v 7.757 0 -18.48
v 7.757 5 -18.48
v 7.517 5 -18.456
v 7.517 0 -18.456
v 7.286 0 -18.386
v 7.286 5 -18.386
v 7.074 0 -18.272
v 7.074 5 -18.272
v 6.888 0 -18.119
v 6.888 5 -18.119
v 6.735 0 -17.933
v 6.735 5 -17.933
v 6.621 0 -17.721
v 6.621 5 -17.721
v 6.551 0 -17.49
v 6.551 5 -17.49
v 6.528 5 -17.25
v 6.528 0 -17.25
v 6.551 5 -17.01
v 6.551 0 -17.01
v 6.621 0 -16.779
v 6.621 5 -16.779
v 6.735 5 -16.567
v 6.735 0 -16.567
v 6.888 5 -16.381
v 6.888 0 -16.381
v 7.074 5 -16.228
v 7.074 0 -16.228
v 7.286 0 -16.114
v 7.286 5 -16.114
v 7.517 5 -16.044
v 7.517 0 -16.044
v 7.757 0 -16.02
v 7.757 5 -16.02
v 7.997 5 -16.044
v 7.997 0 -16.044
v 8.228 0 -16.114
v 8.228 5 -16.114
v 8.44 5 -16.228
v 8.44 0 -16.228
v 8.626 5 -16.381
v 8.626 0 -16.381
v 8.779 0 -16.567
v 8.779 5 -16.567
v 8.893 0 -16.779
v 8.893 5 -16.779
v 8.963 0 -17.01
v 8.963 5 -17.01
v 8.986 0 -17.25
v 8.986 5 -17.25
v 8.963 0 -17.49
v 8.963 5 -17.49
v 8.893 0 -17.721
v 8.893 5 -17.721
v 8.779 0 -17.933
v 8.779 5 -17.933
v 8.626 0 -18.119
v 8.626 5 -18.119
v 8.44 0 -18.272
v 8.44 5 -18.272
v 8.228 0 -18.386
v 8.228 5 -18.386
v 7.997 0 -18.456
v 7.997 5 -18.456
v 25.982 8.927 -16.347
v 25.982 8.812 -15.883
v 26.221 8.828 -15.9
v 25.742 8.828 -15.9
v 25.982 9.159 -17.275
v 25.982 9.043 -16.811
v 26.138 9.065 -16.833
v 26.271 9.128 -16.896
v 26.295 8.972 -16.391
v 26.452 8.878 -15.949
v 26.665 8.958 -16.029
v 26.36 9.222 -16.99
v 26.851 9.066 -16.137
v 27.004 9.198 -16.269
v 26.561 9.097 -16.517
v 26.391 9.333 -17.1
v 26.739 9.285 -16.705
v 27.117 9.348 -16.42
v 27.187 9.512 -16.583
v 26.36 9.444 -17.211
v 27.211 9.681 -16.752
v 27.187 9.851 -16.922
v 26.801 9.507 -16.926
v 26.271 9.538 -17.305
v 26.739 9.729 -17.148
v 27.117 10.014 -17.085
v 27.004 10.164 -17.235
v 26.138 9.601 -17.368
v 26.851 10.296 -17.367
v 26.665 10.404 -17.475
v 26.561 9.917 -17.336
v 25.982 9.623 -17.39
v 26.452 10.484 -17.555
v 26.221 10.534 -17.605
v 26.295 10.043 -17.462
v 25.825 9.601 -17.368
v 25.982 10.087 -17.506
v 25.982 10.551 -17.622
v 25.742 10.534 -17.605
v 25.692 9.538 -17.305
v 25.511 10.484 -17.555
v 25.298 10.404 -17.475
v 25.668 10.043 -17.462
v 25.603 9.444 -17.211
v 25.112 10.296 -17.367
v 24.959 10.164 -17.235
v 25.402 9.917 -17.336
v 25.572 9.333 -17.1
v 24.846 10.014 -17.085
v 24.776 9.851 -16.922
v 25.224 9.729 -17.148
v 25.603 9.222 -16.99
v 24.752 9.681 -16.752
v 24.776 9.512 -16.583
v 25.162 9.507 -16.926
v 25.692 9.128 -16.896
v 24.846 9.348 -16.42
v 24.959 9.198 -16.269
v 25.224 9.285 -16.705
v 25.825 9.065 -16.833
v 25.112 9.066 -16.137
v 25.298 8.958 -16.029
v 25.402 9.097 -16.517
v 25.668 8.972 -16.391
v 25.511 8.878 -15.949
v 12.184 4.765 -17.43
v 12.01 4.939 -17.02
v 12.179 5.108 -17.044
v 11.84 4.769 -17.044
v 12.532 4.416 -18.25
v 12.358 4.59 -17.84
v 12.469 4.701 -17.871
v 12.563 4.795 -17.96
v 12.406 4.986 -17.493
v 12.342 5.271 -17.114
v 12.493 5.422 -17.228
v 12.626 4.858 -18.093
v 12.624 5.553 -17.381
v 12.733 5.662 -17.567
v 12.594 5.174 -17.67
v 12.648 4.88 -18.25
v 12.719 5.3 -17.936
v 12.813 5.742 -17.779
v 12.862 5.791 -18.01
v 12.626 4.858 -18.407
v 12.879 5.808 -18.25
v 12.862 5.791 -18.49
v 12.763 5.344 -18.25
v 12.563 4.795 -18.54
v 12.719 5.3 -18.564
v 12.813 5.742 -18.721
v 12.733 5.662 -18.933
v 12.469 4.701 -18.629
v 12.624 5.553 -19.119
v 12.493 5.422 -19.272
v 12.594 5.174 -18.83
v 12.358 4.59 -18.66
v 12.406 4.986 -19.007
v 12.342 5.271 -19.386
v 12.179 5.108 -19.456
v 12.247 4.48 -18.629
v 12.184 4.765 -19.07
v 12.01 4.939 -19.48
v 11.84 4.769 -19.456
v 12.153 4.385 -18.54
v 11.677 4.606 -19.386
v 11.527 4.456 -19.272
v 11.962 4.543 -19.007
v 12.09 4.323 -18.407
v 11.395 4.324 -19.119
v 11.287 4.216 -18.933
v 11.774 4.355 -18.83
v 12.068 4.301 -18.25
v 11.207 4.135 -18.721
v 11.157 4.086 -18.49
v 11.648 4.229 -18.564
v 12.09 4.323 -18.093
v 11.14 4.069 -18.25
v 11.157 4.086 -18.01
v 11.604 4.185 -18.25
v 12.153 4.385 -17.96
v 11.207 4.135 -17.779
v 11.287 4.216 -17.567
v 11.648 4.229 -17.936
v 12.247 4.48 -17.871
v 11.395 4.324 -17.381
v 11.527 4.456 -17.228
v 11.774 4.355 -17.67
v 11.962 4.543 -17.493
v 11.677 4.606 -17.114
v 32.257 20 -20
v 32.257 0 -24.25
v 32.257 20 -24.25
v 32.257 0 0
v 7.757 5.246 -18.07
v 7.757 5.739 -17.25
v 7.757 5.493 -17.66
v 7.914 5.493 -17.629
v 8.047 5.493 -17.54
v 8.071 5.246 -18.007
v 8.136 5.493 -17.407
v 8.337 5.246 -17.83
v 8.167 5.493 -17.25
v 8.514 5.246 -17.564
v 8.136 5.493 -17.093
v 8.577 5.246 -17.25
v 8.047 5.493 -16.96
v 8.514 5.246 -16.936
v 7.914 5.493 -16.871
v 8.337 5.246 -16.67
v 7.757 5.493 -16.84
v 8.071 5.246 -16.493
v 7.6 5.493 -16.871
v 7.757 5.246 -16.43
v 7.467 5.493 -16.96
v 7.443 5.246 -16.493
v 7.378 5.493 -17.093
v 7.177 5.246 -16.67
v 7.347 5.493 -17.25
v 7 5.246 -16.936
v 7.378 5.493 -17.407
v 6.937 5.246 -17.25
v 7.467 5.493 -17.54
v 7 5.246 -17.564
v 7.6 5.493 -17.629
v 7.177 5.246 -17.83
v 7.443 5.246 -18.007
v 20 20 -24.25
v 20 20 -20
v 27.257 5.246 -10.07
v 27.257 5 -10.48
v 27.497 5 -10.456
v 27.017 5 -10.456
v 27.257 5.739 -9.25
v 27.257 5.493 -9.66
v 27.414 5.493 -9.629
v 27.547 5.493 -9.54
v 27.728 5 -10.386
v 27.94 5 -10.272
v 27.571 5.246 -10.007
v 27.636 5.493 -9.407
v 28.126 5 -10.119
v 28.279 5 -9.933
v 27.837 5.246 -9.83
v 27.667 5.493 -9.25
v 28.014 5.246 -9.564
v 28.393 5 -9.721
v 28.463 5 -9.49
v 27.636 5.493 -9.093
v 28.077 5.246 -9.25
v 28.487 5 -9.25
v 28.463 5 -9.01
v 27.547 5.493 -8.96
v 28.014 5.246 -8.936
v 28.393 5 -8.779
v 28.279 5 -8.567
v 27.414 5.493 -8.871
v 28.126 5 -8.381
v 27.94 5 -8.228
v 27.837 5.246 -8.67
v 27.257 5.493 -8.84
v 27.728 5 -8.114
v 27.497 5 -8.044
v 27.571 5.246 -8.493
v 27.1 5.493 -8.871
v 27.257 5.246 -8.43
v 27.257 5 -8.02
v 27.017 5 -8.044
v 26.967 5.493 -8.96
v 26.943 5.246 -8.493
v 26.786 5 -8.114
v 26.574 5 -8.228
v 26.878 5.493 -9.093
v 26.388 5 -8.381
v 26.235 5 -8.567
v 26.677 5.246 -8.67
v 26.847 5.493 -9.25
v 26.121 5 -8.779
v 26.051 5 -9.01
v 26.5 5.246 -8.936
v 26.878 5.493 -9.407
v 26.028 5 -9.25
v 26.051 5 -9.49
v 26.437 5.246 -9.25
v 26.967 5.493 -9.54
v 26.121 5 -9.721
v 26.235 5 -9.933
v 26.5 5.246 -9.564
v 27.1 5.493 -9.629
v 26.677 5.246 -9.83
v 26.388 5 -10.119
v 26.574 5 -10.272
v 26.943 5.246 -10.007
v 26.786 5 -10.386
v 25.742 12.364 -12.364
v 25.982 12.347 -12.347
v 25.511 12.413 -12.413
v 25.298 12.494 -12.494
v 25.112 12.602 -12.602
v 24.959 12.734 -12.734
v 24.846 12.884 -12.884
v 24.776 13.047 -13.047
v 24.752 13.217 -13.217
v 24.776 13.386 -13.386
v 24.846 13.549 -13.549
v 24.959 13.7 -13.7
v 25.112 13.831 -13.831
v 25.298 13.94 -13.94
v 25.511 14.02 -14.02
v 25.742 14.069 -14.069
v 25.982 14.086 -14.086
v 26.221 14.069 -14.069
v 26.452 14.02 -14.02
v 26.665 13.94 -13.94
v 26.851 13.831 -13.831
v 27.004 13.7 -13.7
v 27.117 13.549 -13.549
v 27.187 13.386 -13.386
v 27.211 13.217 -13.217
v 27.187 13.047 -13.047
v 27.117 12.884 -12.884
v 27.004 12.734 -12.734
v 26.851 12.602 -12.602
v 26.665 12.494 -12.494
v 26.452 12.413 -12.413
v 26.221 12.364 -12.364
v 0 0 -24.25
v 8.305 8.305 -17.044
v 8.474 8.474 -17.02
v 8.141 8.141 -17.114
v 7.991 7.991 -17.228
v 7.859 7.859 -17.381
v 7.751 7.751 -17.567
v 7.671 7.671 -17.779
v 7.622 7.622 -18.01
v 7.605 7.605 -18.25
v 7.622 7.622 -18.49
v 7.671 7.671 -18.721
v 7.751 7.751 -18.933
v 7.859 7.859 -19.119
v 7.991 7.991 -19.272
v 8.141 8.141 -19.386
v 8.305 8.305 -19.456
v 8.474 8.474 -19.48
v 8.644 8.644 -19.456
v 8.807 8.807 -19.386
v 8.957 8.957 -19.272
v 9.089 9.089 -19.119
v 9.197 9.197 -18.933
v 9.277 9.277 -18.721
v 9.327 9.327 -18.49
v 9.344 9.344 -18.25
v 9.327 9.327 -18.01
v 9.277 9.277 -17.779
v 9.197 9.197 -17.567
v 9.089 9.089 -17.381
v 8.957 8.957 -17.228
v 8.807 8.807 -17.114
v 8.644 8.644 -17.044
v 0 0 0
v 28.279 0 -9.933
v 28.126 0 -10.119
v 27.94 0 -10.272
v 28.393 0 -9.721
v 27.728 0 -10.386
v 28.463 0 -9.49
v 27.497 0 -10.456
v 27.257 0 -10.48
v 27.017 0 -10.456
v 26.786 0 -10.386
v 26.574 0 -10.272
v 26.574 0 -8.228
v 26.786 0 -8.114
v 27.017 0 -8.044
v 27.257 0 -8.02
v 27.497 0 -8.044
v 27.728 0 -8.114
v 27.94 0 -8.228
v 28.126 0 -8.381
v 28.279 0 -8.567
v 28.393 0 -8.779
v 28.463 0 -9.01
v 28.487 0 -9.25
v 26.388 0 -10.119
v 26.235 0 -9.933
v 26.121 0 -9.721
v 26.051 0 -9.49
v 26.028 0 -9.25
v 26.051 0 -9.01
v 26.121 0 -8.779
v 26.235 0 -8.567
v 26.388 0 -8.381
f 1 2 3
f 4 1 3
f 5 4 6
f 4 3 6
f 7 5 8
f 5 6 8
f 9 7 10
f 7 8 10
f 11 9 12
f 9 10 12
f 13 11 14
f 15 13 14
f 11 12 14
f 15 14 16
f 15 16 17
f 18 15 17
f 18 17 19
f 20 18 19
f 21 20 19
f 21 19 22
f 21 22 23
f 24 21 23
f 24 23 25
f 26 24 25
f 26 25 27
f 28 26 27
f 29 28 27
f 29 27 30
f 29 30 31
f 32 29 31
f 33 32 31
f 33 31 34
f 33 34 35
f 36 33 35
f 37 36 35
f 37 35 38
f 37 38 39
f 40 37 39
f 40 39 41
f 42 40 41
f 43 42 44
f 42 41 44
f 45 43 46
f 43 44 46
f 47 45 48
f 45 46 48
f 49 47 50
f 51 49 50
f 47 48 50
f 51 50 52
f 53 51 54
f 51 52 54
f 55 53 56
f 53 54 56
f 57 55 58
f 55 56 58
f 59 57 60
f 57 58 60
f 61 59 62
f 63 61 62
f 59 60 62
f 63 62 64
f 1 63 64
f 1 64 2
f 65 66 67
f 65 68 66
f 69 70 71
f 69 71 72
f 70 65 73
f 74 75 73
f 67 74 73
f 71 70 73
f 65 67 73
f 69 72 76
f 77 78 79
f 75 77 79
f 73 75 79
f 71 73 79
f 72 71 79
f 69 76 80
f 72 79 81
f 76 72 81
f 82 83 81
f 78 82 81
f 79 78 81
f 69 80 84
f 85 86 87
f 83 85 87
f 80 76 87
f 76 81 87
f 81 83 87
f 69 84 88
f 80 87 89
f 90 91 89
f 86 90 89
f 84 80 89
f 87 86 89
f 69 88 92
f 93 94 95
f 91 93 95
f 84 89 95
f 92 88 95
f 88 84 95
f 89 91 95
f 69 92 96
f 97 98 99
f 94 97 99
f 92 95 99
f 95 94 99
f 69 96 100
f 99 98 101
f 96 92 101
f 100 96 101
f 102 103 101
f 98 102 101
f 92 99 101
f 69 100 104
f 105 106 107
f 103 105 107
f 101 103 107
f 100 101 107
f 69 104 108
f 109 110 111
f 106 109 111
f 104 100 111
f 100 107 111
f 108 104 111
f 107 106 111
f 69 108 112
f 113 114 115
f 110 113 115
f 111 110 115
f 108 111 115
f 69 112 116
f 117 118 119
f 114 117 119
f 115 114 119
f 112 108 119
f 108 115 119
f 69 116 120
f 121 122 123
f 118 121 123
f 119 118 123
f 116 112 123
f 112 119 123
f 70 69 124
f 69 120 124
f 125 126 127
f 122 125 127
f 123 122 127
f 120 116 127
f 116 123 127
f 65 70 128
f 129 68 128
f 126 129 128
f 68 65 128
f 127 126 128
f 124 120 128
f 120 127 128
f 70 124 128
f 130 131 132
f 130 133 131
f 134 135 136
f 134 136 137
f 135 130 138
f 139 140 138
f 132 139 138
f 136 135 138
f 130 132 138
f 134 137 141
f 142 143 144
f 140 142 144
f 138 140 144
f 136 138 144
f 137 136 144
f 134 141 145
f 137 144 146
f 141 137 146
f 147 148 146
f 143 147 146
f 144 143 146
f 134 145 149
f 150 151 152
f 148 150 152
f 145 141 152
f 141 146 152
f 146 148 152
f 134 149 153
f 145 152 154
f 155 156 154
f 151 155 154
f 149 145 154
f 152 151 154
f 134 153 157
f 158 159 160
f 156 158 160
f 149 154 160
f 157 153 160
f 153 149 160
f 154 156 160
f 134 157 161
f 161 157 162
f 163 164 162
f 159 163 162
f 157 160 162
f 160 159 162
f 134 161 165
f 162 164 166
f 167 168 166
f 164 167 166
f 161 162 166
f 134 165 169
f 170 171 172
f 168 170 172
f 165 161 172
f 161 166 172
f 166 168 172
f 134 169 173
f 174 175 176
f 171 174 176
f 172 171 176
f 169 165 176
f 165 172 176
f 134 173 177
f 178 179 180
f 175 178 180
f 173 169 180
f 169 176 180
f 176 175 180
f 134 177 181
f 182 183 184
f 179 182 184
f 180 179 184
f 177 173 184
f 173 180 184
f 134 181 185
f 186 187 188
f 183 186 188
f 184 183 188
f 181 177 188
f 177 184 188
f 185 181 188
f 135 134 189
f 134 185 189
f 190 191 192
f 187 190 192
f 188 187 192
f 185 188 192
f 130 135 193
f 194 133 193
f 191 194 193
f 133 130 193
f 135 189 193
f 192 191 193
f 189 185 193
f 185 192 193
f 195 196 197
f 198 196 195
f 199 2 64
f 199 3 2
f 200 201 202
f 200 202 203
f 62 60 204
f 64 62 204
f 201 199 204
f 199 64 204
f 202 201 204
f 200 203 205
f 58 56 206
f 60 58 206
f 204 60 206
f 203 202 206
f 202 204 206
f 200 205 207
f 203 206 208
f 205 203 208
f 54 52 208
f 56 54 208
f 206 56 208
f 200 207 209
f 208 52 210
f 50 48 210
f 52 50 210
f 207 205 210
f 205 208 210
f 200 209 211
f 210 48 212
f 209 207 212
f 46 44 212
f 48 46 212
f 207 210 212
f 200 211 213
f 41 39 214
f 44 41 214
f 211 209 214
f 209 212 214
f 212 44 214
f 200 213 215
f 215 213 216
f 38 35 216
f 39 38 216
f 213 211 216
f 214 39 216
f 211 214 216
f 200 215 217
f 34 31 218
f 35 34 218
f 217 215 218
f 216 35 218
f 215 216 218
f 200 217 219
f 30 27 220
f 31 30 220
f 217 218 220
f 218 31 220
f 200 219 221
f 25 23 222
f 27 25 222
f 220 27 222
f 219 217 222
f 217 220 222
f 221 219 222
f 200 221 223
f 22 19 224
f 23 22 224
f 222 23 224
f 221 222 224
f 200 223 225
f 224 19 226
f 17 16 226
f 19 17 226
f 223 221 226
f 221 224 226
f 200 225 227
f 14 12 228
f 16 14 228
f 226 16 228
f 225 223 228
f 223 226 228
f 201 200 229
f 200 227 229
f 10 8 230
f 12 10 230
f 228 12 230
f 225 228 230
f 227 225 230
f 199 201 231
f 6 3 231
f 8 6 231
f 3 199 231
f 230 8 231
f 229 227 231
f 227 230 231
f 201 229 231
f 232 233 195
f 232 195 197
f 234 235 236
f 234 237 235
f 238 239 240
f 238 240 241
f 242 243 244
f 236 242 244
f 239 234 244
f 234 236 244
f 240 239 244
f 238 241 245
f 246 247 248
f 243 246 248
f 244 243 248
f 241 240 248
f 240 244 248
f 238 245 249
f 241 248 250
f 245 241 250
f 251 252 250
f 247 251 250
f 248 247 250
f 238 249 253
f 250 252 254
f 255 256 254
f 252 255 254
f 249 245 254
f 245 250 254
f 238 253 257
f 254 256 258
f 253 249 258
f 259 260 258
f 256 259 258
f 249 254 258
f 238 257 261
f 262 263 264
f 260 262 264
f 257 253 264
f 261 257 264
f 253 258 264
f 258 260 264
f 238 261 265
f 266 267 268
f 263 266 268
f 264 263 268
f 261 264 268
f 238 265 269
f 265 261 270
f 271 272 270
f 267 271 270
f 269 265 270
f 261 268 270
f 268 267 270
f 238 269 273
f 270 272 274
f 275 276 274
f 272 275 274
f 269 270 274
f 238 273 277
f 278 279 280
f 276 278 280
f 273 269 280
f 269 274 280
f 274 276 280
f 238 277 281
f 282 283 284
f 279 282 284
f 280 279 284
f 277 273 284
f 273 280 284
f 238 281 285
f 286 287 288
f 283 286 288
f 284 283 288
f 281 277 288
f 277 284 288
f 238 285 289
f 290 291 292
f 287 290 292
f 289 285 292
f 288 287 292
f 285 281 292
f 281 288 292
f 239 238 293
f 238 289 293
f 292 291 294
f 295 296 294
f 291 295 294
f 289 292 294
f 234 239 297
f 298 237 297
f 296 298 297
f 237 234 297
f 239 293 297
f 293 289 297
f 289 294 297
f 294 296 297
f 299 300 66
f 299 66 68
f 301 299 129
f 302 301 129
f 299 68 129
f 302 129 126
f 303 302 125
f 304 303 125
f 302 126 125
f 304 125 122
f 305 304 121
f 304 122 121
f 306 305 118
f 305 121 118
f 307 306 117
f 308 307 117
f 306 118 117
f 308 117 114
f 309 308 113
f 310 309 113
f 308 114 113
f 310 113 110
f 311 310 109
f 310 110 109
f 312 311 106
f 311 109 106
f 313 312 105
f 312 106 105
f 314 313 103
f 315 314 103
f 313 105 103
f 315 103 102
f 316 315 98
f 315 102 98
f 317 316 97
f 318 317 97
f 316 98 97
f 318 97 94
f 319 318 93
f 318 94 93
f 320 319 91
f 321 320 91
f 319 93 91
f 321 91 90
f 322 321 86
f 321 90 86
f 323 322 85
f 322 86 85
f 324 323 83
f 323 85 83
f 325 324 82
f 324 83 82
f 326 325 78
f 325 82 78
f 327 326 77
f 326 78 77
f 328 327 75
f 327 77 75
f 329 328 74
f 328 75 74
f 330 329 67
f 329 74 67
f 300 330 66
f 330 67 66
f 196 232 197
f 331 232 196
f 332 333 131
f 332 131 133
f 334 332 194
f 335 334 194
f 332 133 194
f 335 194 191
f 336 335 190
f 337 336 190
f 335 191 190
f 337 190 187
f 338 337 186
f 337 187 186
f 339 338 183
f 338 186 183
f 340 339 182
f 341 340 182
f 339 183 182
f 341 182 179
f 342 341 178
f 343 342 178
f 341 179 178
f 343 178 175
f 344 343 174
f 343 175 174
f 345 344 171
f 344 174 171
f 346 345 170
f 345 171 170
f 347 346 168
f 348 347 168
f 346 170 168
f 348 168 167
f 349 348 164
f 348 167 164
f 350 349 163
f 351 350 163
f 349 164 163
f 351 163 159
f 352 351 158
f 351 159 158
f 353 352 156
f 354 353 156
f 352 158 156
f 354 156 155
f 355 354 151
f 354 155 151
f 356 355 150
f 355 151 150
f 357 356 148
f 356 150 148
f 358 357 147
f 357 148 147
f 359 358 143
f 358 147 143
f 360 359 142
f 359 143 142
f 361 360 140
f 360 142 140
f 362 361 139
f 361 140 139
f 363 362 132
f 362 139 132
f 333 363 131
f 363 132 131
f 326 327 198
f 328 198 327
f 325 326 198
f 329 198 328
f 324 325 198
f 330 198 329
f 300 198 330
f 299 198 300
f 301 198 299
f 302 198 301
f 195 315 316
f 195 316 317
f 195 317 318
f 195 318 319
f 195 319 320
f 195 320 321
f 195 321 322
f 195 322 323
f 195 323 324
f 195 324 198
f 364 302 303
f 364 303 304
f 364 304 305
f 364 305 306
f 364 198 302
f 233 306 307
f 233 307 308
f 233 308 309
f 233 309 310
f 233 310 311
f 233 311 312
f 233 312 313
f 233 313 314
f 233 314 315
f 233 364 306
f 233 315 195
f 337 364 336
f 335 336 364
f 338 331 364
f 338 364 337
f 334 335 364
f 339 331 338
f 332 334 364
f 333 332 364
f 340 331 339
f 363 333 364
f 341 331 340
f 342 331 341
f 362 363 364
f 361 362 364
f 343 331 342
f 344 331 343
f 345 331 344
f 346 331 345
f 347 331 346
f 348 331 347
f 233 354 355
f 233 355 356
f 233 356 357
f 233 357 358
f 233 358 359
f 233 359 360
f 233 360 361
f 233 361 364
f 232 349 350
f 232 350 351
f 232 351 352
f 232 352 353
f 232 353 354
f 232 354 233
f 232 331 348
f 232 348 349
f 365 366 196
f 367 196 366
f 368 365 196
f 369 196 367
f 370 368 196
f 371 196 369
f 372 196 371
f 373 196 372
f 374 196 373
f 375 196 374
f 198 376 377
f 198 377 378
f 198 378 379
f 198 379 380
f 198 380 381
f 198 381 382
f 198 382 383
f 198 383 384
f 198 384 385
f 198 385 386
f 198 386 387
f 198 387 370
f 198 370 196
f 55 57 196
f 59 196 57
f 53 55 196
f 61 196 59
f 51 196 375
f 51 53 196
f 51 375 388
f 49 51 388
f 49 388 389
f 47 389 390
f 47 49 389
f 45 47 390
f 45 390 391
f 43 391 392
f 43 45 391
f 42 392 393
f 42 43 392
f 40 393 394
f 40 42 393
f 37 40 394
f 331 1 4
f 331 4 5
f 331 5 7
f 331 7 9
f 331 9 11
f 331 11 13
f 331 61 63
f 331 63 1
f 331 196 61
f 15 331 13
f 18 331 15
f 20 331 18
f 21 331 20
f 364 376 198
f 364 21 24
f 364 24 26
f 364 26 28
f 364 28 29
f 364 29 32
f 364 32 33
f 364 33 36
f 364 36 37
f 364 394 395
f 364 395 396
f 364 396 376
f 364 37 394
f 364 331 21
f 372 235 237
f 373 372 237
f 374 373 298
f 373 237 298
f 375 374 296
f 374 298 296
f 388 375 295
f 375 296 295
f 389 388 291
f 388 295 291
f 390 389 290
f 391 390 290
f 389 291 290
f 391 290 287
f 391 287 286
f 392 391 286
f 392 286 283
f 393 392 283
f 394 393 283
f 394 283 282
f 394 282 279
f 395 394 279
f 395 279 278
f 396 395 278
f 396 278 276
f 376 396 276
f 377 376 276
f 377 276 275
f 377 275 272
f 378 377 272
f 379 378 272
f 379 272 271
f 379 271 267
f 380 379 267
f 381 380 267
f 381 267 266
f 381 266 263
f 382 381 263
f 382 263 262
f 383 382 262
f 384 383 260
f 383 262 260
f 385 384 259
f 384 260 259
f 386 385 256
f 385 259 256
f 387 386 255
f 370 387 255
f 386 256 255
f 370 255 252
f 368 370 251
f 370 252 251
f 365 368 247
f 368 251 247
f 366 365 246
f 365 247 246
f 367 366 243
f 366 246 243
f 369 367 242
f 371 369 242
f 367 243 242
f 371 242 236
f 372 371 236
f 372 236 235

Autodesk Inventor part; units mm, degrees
ref_plane "YZ Plane" through (0, 0, 0) normal (1, 0, 0) x (0, 1, 0)
ref_plane "XZ Plane" through (0, 0, 0) normal (0, 1, 0) x (-1, 0, 0)
ref_plane "XY Plane" through (0, 0, 0) normal (0, 0, 1) x (1, 0, 0)
sketch "Szkic1" plane through (0, 0, 0) normal (1, 0, 0) x (0, 1, 0)
  line L0 (0, 0) -> (20, 0)
  line L1 (20, 0) -> (20, -24.25)
  line L2 (20, -24.25) -> (0, -24.25)
  line L3 (0, -24.25) -> (0, 0)
  line L4 (0, 0) -> (20, -20)
  dimension "d0" = 20
  dimension "d1" = 24.25
  dimension "d4" = 45
extrude "Wyciągnięcie proste1" add sketch "Szkic1" along normal blind 32.257 contours L4 L1 L2 L3
sketch "Szkic2" plane through (0, 0, -24.25) normal (0, 0, -1) x (-1, 0, 0)
  line L0 (0, 0) -> (0, 20) projected
  line L1 (0, 0) -> (0, 20)
  line L2 (0, 0) -> (-20, 20)
  line L3 (0, 20) -> (-32.257, 20) projected
  dimension "d5" = 45
extrude "Wyciągnięcie proste2" cut sketch "Szkic2" against normal up to next
sketch "Szkic3" plane through (32.257, 0, -24.25) normal (0, -1, 0) x (1, 0, 0)
  line L0 (0, 24.25) -> (0, 0) projected
  line L1 (-32.257, 24.25) -> (0, 24.25) projected
  line L2 (-32.257, 24.25) -> (-32.257, 0) projected
  line L3 (-32.257, 0) -> (0, 0) projected
  point P0 (-5, 15)
  point P1 (-24.5, 7)
  dimension "d8" = 5
  dimension "d38" = 24.5
  dimension "d39" = 7
  dimension "d40" = 15
hole "Otwór1" at (27.257, 0, -9.25) at (7.757, 0, -17.25) direction (0, 1, 0) diameter 2.459 depth 5 tip angle 118 thread size "M3x0.5" class "6H" standard "ISO Metric profile"
sketch "Szkic4" plane through (0, 0, 0) normal (0, 0.7071, 0.7071) x (1, 0, 0)
  line L0 (20, 28.2843) -> (32.257, 28.2843) projected
  line L1 (32.257, 28.2843) -> (32.257, 0) projected
  point P0 (0, 0)
  point P1 (25.9815, 18.6912)
  dimension "d19" = 9.5931
  dimension "d20" = 6.2755
hole "Otwór2" at (25.9815, 13.2167, -13.2167) direction (0, -0.7071, -0.7071) diameter 2.459 depth 5 tip angle 118 thread size "M3x0.5" class "6H" standard "ISO Metric profile"
sketch "Szkic5" plane through (0, 0, -24.25) normal (-0.7071, 0.7071, 0) x (-0.7071, -0.7071, 0)
  line L0 (0, 24.25) -> (0, 0) projected
  line L1 (0, 0) -> (-28.2843, 0) projected
  line L2 (-28.2843, 0) -> (-28.2843, 4.25) projected
  point P0 (-11.9843, 6)
  dimension "d29" = 6
  dimension "d37" = 16.3
hole "Otwór3" at (8.4742, 8.4742, -18.25) direction (0.7071, -0.7071, 0) diameter 2.459 depth 5 tip angle 118 thread size "M3x0.5" class "6H" standard "ISO Metric profile"
properties part number "MocowanieBok2"
